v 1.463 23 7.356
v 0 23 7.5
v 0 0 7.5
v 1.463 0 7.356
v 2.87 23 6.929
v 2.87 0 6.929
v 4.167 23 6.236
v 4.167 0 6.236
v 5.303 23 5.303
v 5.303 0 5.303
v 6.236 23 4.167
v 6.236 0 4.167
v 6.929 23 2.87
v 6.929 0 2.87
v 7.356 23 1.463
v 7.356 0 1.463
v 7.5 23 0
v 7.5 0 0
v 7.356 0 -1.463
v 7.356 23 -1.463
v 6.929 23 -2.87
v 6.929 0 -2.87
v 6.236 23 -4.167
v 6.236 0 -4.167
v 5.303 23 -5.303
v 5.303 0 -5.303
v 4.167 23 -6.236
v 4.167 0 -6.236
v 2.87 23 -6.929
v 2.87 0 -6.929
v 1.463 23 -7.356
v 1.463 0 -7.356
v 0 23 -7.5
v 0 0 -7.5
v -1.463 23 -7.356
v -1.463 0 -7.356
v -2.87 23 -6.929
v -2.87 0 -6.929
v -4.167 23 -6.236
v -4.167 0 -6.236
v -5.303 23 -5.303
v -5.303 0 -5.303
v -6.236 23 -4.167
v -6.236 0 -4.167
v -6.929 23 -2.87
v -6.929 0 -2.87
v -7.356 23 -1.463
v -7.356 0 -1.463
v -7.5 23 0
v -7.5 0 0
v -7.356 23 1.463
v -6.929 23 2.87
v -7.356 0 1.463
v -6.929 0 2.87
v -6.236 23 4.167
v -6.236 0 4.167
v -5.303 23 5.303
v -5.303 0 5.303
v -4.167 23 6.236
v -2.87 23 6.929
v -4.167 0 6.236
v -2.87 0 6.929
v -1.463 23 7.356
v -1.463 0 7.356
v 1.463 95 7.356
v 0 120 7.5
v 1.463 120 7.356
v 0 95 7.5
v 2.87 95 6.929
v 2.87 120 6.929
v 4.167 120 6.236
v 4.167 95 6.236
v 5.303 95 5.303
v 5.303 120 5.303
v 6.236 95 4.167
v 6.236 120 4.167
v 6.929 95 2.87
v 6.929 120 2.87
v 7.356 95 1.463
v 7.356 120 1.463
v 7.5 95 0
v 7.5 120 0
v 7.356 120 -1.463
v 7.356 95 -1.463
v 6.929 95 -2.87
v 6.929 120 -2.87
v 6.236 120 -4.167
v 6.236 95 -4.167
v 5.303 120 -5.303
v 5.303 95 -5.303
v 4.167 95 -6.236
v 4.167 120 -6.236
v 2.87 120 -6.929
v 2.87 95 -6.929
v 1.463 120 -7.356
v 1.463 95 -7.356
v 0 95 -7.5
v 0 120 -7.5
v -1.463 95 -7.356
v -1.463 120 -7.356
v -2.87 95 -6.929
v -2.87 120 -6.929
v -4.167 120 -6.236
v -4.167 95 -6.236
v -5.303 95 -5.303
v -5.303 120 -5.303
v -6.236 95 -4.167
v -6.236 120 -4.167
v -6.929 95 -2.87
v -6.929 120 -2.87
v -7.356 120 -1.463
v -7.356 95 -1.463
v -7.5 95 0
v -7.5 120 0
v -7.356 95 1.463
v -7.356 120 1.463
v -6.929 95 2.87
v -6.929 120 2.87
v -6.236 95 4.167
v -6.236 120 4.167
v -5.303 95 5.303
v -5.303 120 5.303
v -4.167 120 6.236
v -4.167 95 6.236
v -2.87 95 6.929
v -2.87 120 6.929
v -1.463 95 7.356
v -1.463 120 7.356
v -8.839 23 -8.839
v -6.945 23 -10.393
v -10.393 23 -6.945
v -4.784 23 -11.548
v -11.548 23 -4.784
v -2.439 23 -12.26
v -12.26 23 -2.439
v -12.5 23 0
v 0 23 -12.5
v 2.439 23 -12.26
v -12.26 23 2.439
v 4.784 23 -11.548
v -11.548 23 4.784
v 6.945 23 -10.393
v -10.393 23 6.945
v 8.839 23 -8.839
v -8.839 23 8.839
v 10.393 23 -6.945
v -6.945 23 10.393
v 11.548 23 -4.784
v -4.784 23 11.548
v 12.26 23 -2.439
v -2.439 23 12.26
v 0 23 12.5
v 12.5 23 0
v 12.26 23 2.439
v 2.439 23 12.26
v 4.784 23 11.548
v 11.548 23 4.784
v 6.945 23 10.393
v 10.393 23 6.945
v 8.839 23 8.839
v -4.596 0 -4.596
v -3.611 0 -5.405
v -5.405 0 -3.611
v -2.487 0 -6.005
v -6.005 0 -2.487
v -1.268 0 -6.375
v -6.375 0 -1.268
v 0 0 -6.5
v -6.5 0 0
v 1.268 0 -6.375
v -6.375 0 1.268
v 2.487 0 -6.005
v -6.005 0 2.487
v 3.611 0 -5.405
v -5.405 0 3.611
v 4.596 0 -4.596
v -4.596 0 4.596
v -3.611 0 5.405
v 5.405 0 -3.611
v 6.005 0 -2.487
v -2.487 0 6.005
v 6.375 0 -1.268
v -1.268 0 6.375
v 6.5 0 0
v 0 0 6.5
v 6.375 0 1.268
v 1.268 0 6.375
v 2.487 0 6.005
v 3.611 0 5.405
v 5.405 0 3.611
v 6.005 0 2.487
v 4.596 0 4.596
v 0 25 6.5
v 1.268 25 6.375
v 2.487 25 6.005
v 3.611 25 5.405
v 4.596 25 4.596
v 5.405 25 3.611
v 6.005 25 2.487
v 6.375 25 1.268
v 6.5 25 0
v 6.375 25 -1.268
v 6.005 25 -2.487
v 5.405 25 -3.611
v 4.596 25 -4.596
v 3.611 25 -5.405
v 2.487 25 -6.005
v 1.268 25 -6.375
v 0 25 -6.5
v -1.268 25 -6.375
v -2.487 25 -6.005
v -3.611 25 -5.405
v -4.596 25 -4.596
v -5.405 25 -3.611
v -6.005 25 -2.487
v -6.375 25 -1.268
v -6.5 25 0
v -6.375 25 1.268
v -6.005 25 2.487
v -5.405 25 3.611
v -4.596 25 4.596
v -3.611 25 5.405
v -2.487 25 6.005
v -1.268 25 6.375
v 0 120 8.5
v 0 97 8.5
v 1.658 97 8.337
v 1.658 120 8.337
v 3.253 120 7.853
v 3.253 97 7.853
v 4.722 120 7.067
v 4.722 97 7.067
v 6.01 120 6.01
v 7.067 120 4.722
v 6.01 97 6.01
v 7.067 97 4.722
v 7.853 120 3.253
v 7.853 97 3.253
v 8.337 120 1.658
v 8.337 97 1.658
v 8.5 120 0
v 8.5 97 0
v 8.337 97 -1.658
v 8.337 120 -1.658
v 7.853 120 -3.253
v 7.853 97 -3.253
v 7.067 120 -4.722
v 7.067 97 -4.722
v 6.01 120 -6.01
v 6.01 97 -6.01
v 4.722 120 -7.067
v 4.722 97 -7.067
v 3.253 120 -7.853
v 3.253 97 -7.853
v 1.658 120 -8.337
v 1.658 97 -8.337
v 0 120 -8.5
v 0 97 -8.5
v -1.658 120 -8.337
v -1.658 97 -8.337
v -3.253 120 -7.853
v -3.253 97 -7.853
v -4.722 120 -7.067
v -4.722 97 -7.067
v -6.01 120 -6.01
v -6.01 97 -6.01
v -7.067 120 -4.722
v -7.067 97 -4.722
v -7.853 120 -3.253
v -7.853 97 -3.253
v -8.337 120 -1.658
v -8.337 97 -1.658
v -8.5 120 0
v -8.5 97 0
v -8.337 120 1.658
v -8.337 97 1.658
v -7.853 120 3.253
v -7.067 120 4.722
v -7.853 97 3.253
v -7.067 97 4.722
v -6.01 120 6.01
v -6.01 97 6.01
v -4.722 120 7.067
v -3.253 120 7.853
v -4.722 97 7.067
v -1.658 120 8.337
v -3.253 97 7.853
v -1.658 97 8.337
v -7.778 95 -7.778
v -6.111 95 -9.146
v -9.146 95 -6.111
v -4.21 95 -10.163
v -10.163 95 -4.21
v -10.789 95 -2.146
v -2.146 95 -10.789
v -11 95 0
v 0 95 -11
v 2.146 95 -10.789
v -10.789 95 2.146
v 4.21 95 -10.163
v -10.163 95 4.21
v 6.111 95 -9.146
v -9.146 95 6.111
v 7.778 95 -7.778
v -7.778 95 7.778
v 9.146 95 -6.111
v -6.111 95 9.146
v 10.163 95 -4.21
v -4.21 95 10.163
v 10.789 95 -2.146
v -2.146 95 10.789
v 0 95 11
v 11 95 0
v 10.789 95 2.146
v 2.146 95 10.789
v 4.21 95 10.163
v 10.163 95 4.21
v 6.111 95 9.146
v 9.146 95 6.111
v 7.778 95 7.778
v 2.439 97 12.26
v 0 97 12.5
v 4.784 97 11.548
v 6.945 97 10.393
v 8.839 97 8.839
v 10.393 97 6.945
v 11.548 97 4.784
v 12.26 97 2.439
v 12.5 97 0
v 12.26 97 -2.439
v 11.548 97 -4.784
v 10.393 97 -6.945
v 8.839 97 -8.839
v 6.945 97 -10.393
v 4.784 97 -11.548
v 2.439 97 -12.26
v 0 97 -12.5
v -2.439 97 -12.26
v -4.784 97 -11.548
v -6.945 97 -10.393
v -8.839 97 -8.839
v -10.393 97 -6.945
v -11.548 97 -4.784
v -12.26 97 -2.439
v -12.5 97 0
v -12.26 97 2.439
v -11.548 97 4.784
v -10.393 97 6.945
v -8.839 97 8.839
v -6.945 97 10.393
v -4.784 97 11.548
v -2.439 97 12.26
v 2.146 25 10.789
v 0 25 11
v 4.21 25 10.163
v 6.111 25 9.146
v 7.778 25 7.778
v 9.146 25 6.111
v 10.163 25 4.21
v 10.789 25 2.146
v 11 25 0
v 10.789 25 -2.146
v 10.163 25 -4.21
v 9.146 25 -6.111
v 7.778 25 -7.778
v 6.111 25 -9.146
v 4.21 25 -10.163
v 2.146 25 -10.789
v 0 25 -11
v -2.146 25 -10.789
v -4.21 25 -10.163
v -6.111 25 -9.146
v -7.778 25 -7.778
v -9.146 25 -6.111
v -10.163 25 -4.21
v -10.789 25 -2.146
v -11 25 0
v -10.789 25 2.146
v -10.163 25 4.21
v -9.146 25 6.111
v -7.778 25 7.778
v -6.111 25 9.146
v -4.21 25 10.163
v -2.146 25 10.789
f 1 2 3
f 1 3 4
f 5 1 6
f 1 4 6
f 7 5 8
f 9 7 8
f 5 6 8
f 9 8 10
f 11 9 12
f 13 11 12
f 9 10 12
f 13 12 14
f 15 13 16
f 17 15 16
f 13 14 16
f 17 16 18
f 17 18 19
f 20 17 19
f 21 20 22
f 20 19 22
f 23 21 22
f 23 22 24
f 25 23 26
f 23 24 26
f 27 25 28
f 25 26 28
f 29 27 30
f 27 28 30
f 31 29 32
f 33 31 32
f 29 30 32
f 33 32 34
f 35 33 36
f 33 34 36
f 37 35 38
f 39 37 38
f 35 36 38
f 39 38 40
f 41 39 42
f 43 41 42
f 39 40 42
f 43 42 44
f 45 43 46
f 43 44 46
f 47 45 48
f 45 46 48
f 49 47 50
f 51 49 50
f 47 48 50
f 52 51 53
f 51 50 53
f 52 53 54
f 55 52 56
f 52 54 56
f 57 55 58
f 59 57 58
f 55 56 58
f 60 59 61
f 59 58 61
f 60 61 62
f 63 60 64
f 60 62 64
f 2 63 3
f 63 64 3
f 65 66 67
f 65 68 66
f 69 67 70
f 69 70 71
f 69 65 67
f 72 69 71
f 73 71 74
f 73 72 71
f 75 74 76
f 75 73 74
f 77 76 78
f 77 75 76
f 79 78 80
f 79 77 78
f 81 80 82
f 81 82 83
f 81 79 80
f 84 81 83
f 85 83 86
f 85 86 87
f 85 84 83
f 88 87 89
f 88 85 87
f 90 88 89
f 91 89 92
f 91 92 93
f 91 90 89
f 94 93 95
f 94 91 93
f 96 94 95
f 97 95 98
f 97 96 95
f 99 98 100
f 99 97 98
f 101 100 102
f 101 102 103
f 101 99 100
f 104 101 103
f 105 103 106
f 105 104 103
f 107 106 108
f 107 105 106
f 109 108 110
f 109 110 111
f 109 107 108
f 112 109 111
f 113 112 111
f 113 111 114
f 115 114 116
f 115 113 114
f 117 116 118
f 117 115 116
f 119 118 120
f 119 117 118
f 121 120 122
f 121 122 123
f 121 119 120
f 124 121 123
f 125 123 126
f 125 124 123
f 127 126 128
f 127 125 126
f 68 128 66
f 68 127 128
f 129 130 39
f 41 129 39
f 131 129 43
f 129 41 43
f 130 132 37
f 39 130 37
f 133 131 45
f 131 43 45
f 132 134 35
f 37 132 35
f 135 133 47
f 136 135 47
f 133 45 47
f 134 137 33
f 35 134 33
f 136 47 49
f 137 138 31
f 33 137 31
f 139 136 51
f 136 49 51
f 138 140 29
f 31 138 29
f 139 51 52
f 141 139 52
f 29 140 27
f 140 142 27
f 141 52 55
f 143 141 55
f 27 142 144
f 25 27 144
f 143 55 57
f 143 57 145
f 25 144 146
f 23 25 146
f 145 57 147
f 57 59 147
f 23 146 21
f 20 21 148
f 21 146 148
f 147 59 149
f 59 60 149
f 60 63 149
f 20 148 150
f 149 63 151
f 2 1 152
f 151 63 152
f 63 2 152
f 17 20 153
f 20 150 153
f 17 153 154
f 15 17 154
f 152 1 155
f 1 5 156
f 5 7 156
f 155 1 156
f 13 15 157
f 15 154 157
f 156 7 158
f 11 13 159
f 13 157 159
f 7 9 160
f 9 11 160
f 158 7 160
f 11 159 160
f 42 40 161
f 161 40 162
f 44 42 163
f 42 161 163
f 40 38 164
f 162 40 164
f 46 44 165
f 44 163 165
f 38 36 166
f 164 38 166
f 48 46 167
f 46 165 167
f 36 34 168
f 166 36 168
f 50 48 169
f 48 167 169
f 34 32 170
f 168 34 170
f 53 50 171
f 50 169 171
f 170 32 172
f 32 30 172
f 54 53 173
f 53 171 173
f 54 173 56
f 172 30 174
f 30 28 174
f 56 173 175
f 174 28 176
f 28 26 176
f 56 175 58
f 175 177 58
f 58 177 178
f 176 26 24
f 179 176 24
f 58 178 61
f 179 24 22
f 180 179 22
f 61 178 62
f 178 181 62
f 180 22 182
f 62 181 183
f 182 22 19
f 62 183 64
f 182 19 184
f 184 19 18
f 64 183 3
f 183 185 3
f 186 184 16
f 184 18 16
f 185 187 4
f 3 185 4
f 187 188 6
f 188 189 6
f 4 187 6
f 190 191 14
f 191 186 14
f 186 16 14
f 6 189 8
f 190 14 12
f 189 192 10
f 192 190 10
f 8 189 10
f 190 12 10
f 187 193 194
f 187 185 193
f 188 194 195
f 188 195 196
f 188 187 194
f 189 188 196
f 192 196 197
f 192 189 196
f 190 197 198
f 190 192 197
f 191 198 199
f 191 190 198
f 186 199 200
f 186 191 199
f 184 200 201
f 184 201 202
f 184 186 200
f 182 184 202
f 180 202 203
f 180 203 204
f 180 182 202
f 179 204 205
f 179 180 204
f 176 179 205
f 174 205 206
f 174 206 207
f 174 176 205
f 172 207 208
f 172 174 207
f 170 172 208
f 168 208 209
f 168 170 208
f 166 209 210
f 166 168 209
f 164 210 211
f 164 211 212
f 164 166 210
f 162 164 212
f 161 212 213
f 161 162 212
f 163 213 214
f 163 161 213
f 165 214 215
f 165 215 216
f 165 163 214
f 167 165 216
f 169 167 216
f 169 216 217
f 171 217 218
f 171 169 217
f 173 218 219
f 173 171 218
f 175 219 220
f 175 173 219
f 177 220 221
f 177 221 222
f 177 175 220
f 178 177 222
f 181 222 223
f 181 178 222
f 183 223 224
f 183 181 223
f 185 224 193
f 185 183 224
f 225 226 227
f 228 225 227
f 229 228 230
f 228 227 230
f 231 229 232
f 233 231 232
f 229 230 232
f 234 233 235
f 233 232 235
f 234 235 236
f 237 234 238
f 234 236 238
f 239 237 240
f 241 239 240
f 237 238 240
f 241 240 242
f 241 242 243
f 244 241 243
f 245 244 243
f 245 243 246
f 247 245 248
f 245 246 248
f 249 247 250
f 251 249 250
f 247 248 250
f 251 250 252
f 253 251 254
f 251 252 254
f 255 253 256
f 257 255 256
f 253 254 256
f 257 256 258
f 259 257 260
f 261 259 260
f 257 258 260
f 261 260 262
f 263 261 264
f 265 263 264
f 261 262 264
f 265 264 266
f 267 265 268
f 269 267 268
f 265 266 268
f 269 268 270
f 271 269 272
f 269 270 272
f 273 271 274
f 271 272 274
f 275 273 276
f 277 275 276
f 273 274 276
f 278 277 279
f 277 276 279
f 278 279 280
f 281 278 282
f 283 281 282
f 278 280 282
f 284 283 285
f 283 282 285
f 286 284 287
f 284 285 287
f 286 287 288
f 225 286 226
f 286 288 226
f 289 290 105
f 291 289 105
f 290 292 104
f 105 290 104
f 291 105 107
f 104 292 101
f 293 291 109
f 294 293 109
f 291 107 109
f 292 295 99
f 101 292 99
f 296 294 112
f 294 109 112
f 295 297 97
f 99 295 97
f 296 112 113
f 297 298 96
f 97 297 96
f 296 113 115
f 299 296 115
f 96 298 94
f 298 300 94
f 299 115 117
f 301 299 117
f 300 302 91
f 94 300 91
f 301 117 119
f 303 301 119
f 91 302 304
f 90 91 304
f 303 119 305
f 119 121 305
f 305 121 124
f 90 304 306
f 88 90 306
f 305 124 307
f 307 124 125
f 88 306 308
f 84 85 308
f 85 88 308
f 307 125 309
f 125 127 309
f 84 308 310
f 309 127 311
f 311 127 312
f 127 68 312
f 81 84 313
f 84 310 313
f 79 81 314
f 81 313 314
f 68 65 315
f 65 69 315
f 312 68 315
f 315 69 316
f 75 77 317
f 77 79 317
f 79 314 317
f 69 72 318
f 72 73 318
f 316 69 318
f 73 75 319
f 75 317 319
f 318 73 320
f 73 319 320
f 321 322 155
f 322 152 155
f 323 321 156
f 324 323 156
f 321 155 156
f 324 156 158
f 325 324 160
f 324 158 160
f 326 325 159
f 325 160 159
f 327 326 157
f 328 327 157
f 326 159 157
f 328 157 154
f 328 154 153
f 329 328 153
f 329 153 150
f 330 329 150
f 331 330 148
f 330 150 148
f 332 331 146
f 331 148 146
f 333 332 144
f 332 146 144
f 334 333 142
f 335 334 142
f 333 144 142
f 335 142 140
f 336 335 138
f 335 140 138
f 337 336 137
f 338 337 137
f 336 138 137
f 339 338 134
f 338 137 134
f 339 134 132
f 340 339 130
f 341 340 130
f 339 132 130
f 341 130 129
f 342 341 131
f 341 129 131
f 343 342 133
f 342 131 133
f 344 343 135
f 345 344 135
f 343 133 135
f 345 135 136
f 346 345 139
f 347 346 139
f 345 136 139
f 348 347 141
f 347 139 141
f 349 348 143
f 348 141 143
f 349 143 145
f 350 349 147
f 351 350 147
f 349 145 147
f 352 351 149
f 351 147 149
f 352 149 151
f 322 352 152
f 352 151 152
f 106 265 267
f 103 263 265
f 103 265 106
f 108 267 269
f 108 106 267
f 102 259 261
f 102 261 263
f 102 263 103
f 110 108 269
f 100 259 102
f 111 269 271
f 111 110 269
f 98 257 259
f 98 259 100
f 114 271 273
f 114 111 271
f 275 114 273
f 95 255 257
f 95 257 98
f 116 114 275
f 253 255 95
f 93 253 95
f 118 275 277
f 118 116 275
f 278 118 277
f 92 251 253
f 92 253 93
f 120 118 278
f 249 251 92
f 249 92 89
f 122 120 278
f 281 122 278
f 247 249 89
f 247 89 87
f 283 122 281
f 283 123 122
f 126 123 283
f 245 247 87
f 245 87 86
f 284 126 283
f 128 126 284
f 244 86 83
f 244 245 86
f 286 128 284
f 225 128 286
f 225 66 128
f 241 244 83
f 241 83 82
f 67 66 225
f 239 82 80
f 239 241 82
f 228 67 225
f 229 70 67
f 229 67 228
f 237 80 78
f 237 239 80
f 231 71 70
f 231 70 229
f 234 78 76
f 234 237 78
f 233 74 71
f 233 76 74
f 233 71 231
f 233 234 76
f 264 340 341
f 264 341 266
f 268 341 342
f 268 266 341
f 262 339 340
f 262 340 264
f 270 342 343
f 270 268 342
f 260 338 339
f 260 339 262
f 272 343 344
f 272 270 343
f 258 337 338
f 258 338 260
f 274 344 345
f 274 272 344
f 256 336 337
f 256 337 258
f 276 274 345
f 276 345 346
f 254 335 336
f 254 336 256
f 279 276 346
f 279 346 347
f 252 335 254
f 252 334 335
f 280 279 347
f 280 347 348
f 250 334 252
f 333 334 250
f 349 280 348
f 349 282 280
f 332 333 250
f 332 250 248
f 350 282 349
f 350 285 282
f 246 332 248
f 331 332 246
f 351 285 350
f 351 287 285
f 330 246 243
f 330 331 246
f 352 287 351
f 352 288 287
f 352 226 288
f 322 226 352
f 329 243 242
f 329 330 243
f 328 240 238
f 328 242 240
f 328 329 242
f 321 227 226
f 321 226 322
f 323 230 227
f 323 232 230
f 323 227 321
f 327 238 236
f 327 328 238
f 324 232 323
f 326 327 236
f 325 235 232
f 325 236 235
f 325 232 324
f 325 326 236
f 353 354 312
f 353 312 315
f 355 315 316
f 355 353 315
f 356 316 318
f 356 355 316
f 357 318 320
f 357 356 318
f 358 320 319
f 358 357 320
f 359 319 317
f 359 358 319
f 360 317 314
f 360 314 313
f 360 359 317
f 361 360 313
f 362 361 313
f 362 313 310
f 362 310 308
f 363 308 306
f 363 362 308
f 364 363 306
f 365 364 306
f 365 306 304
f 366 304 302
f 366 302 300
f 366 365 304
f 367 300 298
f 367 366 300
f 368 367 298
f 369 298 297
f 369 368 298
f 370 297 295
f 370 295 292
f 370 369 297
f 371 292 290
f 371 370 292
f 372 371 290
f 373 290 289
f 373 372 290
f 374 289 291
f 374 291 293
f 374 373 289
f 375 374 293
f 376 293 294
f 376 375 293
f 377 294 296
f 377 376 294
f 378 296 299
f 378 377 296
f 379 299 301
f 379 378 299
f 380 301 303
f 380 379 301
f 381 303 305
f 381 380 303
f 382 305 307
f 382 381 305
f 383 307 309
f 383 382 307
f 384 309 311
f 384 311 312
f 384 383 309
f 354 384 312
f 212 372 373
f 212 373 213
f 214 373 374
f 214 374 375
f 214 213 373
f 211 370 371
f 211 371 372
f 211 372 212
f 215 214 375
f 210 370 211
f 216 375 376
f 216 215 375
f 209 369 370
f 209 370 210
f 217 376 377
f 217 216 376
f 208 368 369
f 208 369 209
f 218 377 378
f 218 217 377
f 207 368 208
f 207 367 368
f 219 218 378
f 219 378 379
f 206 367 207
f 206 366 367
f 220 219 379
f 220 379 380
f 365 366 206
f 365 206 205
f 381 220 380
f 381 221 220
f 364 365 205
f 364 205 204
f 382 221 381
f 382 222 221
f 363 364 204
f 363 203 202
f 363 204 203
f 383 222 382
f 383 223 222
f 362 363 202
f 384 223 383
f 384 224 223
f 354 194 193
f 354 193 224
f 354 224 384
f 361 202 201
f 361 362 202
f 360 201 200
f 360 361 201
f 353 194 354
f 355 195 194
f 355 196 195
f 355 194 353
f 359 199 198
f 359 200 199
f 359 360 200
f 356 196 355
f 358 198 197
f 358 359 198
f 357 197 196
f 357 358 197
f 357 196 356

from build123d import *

# Parameters (mm, degrees)
SKETCH1_R           = 7.5
SKETCH1_R_2         = 6.5
BOSS_EXTRUDE1_DEPTH = 23
SKETCH2_R           = 12.5
SKETCH2_R_2         = 6.5
BOSS_EXTRUDE2_DEPTH = 2
SKETCH3_R           = 12.5
SKETCH3_R_2         = 11
BOSS_EXTRUDE3_DEPTH = 70
SKETCH4_R           = 12.5
SKETCH4_R_2         = 7.5
BOSS_EXTRUDE4_DEPTH = 2
SKETCH5_R           = 8.5
SKETCH5_R_2         = 7.5
BOSS_EXTRUDE5_DEPTH = 23


with BuildPart() as part:
    # Sketch1 → Boss-Extrude1 (new body)
    with BuildSketch(Plane(origin=(0, 0, 0), x_dir=(1, 0, 0), z_dir=(0, 1, 0))):
        with Locations(Location((0, 0, 0), (0, 0, 270))):
            Circle(SKETCH1_R)
        with Locations(Location((0, 0, 0), (0, 0, 270))):
            Circle(SKETCH1_R_2, mode=Mode.SUBTRACT)
    extrude(amount=BOSS_EXTRUDE1_DEPTH)

    # Sketch2 → Boss-Extrude2 (add)
    with BuildSketch(Plane(origin=(0, 23, 0), x_dir=(1, 0, 0), z_dir=(0, 1, 0))):
        with Locations(Location((0, 0, 0), (0, 0, 270))):
            Circle(SKETCH2_R)
        with Locations(Location((0, 0, 0), (0, 0, 270))):
            Circle(SKETCH2_R_2, mode=Mode.SUBTRACT)
    extrude(amount=BOSS_EXTRUDE2_DEPTH)

    # Sketch3 → Boss-Extrude3 (add)
    with BuildSketch(Plane(origin=(0, 25, 0), x_dir=(1, 0, 0), z_dir=(0, 1, 0))):
        with Locations(Location((0, 0, 0), (0, 0, 270))):
            Circle(SKETCH3_R)
        with Locations(Location((0, 0, 0), (0, 0, 270))):
            Circle(SKETCH3_R_2, mode=Mode.SUBTRACT)
    extrude(amount=BOSS_EXTRUDE3_DEPTH)

    # Sketch4 → Boss-Extrude4 (add)
    with BuildSketch(Plane(origin=(0, 95, 0), x_dir=(1, 0, 0), z_dir=(0, 1, 0))):
        with Locations(Location((0, 0, 0), (0, 0, 270))):
            Circle(SKETCH4_R)
        with Locations(Location((0, 0, 0), (0, 0, 270))):
            Circle(SKETCH4_R_2, mode=Mode.SUBTRACT)
    extrude(amount=BOSS_EXTRUDE4_DEPTH)

    # Sketch5 → Boss-Extrude5 (add)
    with BuildSketch(Plane(origin=(0, 97, 0), x_dir=(1, 0, 0), z_dir=(0, 1, 0))):
        with Locations(Location((0, 0, 0), (0, 0, 270))):
            Circle(SKETCH5_R)
        with Locations(Location((0, 0, 0), (0, 0, 270))):
            Circle(SKETCH5_R_2, mode=Mode.SUBTRACT)
    extrude(amount=BOSS_EXTRUDE5_DEPTH)


solid = part.part
